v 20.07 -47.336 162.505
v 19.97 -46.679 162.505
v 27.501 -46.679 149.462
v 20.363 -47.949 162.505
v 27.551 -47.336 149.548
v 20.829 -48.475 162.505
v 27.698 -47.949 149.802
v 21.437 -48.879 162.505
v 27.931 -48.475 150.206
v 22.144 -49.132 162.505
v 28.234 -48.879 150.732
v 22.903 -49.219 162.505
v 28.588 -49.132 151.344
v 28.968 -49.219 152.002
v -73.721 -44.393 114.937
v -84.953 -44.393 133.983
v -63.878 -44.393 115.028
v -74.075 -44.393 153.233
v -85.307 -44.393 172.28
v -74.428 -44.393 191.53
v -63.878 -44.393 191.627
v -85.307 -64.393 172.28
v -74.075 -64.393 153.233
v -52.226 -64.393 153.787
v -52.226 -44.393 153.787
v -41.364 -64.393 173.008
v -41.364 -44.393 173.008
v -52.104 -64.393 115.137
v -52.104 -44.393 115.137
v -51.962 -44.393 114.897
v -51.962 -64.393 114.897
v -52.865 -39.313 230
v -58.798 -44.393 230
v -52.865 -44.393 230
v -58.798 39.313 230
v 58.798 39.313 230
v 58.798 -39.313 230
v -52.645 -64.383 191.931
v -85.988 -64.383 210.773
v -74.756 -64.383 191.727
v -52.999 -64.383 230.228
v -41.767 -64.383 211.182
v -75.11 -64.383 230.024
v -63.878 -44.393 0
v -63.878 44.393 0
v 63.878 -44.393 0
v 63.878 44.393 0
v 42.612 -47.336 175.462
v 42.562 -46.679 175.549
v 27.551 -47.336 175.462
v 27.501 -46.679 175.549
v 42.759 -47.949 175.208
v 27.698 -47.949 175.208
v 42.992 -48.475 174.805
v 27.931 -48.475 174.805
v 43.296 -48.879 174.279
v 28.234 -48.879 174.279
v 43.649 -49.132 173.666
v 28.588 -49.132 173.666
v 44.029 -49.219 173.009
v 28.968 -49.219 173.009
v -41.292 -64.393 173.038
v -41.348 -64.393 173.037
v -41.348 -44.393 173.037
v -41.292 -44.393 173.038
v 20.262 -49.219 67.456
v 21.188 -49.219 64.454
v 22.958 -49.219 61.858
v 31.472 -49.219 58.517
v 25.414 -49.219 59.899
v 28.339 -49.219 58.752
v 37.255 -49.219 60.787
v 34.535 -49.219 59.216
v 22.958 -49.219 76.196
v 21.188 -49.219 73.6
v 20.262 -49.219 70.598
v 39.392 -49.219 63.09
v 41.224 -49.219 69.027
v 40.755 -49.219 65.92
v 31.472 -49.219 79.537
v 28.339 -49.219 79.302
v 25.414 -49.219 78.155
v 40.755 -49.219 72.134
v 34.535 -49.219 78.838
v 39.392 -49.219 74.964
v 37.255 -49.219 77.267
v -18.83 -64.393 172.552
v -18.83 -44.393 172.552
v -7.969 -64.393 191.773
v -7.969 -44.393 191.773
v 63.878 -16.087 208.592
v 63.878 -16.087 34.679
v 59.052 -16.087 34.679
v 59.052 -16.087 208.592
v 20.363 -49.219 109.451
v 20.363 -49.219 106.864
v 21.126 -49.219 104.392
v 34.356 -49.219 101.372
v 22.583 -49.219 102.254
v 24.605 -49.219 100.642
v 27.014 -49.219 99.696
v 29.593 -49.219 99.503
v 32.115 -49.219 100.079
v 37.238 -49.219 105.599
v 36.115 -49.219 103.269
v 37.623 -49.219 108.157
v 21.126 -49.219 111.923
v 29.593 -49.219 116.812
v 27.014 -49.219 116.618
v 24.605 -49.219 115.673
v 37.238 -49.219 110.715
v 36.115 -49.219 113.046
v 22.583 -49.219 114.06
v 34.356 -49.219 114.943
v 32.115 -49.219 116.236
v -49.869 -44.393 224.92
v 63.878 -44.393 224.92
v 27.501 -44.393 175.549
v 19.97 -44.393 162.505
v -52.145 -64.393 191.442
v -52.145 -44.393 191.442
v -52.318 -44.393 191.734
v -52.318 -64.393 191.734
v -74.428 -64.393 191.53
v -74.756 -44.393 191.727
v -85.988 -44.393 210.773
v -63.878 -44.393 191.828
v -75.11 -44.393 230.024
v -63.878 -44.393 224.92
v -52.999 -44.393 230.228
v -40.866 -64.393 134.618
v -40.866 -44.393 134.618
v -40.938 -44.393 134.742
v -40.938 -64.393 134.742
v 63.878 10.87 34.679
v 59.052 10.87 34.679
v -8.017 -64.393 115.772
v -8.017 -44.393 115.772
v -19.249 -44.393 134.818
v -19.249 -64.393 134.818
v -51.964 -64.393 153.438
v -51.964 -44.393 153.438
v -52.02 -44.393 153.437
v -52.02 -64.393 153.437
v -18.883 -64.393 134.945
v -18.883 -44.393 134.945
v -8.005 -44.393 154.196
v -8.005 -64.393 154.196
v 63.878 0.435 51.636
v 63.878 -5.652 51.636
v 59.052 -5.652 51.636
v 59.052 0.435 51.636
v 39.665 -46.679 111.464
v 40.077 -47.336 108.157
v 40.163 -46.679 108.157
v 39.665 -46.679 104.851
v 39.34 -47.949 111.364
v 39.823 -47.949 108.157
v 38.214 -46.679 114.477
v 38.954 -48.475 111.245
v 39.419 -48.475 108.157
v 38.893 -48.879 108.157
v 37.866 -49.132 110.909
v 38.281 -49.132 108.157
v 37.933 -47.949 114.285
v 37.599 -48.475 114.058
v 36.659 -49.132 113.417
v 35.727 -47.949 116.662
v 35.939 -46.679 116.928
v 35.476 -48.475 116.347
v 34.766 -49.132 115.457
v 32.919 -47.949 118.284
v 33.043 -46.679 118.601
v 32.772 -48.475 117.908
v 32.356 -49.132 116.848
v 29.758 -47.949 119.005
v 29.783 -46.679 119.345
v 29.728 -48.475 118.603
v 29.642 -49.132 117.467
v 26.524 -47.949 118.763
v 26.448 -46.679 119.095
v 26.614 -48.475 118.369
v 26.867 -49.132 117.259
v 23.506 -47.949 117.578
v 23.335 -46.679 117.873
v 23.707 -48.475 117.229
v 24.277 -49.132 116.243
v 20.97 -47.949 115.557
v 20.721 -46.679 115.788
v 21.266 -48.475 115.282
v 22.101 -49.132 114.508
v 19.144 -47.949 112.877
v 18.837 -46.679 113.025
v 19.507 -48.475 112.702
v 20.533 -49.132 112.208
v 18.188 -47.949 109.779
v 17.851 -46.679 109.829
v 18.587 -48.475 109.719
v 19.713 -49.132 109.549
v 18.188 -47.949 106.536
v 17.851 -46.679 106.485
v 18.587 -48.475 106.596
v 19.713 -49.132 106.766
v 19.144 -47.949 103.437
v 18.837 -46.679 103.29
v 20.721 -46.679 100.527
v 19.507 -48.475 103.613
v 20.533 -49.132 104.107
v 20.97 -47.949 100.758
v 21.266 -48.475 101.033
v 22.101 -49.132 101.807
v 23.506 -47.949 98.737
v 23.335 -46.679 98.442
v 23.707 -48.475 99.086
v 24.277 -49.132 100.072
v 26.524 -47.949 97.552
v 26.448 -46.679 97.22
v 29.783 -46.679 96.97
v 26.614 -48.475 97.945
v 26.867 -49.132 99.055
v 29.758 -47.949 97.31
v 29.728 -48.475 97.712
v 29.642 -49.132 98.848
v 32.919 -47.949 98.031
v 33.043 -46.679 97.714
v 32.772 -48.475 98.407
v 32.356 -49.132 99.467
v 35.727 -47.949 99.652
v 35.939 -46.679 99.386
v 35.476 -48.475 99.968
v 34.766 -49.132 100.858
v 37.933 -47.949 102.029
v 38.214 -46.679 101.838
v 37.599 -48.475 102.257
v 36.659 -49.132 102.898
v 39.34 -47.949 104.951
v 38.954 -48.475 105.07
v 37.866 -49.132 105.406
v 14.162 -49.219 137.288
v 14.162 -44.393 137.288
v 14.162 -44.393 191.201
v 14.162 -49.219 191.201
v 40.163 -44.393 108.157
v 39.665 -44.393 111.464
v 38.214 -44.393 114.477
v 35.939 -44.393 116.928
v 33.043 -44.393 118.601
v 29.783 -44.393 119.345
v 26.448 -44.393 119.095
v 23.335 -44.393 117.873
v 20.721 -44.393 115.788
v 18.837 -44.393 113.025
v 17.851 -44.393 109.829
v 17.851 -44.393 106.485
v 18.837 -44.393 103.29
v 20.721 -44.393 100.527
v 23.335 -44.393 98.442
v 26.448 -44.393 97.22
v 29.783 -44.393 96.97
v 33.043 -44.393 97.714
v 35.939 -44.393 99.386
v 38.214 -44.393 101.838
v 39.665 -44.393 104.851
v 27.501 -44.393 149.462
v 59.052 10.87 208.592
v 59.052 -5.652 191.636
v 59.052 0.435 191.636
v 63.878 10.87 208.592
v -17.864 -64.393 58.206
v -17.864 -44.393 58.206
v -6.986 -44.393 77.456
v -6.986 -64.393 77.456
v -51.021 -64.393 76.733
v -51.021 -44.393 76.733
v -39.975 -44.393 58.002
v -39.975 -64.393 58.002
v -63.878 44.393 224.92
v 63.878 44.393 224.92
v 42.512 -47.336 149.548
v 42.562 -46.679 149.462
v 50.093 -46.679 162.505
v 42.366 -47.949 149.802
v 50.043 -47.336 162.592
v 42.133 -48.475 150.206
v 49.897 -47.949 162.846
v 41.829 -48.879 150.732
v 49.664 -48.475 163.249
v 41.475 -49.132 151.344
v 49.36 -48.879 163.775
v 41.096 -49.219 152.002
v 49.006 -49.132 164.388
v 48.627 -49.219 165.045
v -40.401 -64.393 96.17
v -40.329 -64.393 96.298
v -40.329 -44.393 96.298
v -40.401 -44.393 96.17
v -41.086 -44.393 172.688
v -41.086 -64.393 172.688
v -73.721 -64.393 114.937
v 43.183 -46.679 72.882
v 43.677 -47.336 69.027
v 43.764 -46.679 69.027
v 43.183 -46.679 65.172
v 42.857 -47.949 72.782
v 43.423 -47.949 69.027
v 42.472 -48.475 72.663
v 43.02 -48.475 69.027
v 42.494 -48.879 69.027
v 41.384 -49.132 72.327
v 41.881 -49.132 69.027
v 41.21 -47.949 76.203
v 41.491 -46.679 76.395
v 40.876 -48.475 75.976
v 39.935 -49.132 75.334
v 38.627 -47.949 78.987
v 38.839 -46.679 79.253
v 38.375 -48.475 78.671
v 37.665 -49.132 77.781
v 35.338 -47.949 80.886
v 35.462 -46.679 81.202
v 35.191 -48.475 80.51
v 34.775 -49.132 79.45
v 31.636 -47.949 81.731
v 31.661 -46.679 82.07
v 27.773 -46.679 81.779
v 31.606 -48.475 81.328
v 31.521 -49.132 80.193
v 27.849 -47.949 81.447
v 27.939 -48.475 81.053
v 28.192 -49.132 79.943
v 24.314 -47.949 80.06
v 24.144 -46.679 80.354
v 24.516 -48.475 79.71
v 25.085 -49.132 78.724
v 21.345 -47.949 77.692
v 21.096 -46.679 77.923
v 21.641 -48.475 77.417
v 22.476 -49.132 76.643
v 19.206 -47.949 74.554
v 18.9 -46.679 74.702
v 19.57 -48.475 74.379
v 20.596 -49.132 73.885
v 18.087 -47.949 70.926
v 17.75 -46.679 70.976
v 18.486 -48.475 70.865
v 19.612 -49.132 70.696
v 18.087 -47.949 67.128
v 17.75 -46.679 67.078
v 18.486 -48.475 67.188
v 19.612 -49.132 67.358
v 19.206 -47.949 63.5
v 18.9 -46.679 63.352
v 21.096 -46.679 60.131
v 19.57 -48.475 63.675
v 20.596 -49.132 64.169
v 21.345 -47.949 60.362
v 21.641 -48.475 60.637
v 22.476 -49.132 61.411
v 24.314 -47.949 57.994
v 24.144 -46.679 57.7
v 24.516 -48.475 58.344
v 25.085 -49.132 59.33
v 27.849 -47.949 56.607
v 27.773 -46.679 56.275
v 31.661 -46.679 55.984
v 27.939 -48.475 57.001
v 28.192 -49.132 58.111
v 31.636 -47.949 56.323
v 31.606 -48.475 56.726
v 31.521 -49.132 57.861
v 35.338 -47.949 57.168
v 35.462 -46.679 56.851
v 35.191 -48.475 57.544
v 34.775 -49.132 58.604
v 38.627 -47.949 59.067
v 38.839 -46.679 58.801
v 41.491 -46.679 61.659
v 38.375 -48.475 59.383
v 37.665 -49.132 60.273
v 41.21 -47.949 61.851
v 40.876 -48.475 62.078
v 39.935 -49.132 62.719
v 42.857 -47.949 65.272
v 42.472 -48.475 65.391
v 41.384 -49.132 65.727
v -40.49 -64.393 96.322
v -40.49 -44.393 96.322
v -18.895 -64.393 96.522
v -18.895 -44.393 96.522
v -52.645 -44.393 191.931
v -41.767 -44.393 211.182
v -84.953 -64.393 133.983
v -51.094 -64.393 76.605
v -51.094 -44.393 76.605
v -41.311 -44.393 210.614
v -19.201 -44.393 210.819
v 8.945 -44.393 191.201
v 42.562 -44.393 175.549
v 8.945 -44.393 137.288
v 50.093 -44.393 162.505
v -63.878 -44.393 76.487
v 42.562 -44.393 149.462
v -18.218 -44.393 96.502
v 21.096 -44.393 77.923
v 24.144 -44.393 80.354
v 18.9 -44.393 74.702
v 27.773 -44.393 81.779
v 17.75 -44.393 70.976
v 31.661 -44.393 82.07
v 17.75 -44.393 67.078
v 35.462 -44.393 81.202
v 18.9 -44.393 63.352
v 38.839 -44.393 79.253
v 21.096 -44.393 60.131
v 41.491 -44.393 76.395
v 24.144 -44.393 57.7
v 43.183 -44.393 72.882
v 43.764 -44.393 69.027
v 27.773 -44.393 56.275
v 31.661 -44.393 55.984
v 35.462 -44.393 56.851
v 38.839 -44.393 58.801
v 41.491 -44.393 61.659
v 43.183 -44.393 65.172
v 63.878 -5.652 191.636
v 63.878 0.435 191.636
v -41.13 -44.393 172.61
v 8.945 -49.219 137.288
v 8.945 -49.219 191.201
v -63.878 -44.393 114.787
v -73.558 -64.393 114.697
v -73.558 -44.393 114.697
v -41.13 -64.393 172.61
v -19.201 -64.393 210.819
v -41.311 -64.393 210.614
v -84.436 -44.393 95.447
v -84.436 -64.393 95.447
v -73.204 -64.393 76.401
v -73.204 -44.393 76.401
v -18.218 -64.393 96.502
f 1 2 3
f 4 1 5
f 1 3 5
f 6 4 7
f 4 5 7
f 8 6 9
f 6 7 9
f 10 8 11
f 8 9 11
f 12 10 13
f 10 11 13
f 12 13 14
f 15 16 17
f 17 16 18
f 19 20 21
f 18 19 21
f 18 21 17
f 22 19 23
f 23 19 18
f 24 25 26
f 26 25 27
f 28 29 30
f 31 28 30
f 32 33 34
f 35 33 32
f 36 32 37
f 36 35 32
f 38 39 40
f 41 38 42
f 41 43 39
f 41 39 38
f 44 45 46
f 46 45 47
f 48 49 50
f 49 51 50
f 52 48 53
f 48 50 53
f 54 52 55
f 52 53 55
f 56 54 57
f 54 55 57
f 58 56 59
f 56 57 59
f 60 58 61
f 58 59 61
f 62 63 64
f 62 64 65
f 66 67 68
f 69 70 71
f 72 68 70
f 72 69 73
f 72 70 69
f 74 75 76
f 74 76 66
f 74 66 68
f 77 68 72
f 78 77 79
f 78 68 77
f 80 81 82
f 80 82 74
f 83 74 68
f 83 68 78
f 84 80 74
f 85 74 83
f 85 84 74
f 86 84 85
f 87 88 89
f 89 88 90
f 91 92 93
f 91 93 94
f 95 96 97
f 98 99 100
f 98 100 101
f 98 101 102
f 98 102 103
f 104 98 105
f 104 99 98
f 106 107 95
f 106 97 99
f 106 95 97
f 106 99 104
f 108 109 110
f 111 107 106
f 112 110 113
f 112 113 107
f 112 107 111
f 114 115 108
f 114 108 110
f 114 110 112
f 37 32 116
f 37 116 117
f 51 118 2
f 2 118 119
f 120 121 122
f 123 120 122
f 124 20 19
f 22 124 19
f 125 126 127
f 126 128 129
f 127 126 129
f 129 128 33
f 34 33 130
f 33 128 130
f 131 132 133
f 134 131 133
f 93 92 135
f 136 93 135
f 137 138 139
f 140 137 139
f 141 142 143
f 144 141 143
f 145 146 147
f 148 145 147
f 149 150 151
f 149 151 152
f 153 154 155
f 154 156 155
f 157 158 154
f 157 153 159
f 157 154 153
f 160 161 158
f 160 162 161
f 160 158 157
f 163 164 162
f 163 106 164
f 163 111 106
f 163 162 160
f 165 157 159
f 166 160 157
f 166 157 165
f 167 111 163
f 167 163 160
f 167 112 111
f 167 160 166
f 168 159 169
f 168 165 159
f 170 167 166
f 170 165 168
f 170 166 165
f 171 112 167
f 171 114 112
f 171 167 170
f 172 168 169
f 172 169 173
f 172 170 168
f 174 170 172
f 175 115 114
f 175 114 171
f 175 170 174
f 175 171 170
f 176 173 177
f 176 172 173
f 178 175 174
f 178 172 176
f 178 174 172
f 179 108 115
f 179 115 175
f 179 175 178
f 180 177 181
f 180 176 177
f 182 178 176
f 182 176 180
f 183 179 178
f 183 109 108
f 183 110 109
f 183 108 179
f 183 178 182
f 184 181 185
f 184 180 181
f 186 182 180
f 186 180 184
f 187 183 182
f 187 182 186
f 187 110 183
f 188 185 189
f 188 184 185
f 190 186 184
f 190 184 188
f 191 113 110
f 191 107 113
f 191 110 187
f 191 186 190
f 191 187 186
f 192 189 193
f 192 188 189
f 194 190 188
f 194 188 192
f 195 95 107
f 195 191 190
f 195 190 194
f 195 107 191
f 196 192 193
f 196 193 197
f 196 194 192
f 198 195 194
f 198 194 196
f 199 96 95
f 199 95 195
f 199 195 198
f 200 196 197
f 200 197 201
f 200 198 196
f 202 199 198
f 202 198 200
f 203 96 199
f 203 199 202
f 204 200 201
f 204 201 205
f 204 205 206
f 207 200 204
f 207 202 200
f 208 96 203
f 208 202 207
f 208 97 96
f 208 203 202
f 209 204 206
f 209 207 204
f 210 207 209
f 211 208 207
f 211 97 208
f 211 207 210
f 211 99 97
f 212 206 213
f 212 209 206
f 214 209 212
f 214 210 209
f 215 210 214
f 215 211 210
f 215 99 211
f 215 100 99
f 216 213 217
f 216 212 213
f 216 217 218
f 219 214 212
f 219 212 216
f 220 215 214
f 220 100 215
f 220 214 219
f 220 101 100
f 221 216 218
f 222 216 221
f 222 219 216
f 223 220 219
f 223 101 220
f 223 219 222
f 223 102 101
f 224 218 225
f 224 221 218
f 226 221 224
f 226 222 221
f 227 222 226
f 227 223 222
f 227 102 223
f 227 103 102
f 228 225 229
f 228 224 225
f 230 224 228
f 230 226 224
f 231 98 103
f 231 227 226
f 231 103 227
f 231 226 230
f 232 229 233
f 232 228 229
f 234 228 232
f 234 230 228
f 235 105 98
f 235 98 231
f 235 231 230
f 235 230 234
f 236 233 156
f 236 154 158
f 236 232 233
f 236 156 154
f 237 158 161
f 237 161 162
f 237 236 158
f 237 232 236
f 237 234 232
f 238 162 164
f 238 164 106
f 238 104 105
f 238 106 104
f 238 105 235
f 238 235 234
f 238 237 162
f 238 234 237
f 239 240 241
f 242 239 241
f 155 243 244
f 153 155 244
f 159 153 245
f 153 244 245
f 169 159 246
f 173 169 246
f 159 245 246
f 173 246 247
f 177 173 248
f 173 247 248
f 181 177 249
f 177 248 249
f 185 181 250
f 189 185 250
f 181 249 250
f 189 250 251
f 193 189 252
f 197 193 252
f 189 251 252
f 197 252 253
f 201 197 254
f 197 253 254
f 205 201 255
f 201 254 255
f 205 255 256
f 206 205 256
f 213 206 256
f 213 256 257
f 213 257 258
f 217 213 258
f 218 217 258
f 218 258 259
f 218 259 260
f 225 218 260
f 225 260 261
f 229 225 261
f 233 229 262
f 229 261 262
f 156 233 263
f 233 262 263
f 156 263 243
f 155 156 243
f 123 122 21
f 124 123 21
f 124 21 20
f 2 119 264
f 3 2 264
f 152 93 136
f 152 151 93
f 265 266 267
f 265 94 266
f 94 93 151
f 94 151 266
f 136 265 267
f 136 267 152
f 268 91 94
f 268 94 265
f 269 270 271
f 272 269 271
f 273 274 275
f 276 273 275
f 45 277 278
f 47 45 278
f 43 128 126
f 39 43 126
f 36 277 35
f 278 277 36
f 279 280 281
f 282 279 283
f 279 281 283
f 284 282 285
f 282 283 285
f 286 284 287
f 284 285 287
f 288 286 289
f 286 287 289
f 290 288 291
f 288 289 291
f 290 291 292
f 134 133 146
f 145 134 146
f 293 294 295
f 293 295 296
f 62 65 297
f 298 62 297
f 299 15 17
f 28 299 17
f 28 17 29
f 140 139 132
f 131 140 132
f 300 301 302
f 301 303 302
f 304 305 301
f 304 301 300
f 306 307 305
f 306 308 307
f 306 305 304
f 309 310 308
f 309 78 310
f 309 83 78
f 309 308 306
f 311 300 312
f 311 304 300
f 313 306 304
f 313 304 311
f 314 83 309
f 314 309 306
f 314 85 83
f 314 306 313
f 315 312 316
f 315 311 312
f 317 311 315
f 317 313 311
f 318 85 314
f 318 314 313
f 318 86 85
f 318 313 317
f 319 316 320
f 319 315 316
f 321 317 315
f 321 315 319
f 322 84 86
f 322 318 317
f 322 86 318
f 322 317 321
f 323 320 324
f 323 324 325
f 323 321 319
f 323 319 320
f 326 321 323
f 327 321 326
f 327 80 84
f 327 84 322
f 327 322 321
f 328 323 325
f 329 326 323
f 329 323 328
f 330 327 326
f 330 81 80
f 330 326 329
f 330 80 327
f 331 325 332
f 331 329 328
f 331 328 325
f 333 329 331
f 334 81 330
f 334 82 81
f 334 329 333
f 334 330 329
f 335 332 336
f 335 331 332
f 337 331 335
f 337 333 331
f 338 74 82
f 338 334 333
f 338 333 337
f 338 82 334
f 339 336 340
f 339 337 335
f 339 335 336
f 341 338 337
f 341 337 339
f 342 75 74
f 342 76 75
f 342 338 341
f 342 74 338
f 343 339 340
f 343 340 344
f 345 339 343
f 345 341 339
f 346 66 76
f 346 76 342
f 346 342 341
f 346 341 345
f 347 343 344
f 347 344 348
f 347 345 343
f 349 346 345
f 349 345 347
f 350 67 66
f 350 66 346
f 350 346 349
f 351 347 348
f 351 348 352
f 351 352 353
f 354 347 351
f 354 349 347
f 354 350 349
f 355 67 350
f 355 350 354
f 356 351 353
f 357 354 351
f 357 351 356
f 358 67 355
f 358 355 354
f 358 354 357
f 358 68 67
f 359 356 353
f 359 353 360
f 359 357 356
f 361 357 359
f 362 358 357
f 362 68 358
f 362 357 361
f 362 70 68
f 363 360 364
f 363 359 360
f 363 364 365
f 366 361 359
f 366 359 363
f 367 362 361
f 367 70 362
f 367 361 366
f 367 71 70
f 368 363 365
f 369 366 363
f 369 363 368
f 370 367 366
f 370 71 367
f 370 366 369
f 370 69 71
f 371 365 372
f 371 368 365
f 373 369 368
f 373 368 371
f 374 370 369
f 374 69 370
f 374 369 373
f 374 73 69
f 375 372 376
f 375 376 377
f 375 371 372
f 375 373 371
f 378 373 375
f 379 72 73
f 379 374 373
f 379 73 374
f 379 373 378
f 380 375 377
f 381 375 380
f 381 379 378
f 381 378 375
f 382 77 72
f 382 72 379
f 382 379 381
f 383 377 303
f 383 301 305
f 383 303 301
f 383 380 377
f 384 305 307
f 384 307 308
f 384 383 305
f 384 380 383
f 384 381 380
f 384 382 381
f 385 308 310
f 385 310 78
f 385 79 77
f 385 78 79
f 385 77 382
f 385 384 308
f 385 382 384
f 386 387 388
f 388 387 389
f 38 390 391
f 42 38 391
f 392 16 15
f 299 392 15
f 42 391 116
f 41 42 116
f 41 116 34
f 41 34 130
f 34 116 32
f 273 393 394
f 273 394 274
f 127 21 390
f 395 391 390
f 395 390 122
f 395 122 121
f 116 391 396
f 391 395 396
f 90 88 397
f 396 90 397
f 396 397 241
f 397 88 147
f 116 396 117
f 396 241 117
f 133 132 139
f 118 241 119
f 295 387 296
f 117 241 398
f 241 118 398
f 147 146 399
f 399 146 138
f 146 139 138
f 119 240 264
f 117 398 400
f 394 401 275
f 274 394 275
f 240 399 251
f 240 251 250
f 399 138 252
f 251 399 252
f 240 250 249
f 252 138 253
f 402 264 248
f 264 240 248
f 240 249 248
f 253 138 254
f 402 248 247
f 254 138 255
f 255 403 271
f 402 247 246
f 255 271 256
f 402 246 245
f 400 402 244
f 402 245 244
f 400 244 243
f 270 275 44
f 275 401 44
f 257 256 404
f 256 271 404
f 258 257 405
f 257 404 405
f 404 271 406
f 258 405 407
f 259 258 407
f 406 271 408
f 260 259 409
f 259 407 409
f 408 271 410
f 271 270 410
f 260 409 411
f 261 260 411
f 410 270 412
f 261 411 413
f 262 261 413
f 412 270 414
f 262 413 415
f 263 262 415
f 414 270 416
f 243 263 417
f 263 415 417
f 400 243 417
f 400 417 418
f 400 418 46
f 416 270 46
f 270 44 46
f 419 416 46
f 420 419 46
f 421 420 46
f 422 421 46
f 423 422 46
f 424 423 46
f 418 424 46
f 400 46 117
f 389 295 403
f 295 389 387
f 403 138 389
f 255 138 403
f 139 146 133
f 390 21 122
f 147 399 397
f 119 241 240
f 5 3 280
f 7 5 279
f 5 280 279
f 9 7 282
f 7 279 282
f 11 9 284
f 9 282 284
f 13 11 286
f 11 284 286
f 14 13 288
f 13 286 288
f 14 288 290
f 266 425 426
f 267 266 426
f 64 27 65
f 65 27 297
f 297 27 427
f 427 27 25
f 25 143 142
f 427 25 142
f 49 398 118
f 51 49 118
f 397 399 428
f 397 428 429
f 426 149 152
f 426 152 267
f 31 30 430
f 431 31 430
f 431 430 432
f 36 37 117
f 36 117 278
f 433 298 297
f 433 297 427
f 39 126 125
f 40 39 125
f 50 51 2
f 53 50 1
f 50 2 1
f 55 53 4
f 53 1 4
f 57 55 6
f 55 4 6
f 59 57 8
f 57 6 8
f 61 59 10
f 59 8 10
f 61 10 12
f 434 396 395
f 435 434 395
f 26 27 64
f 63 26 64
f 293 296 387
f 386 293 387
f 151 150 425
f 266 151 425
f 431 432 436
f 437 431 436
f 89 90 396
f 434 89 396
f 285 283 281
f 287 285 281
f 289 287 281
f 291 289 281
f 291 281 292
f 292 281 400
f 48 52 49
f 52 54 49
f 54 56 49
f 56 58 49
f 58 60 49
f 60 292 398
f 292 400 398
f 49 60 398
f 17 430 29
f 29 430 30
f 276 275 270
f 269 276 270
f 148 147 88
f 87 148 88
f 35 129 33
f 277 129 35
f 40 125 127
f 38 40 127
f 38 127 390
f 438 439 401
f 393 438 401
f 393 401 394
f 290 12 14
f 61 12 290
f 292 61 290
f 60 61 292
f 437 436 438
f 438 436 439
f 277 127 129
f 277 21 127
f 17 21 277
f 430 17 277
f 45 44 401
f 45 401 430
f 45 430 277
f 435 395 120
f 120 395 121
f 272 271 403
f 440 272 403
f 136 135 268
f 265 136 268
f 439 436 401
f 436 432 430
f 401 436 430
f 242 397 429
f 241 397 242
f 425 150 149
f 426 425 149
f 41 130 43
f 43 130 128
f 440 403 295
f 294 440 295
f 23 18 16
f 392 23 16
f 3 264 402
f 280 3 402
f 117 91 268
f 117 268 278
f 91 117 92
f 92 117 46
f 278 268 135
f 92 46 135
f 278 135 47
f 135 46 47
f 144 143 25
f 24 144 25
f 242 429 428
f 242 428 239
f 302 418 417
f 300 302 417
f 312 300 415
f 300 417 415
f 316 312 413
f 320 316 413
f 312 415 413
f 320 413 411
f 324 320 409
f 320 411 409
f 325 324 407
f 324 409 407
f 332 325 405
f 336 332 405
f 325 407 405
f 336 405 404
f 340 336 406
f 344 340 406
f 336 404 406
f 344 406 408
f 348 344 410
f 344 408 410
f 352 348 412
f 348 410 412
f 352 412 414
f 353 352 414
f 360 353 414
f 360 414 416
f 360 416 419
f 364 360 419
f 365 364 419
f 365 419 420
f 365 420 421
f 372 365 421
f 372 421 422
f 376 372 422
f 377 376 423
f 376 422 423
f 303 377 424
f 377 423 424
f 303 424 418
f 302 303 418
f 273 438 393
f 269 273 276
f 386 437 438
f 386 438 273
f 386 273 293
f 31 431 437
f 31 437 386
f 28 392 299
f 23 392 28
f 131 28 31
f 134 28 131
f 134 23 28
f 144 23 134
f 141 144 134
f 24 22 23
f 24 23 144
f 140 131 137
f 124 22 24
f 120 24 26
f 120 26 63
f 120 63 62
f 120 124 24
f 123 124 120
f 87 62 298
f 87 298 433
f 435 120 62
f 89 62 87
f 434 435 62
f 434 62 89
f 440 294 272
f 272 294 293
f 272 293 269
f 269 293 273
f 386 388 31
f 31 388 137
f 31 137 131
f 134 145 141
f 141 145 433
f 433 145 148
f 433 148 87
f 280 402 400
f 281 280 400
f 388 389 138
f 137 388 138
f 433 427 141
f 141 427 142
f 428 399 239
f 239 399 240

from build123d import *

# Parameters (mm, degrees)
F0_W      = 127.7551352978
F0_H      = 88.7857824564
F1_DEPTH  = 230
F4_DEPTH  = 20
F5_DEPTH  = 19.9898
F6_W      = 26.9565298222
F6_H      = 173.913128674
F6_W_2    = 6.0869585723
F6_H_2    = 140.0000751019
F7_DEPTH  = 4.826
F8_SIZE   = 5.08
F9_R      = 13.0796675924
F9_R_2    = 11.2186028003
F9_W      = 5.2173919976
F9_H      = 53.9130866528
F10_DEPTH = 4.826
F11_R     = 2.54


with BuildPart() as f1:
    # F0 (on Top) → F1 (new body)
    with BuildSketch(Plane.XY):
        Rectangle(F0_W, F0_H)
    extrude(amount=F1_DEPTH)

    # F3 (on face) → F4 (join)
    with BuildSketch(Plane.XZ.offset(44.3928912282)):
        Polygon((-41.2921301063, 173.0379974811), (-41.085819379, 172.688162985), (-41.1297441764, 172.6104329043), (-40.9572269026, 172.3179008855), (-18.8467815635, 172.5222300093), (-18.8301746286, 172.5516179285), (-19.2372092384, 173.2418134869), align=None)
        Polygon((-40.9572269026, 172.3179008855), (-41.1297441764, 172.6104329043), (-51.9640878366, 153.4377910705), (-40.9382216824, 134.7415827759), (-18.8833008145, 134.9453987817), (-8.0050323569, 154.1957706962), (-18.8301746286, 172.5516179285), (-18.8467815635, 172.5222300093), align=None)
        Polygon((-41.3476545775, 173.0374843632), (-41.2921301063, 173.0379974811), (-52.1454789867, 191.4416737569), (-52.1894037841, 191.3639436762), (-41.3642615124, 173.008096444), align=None)
        Polygon((-52.1454789867, 191.4416737569), (-41.2921301063, 173.0379974811), (-19.2372092384, 173.2418134869), (-18.8301746286, 172.5516179285), (-7.968513106, 191.7726019238), (-19.2006899874, 210.8186447145), (-41.3111353265, 210.6143155907), align=None)
        Polygon((-40.9382216824, 134.7415827759), (-51.9640878366, 153.4377910705), (-52.0196123078, 153.4372779525), (-40.9937461536, 134.7410696579), align=None)
        Polygon((-52.225923035, 153.7871124486), (-41.3642615124, 173.008096444), (-52.1894037841, 191.3639436762), (-52.1454789867, 191.4416737569), (-52.3179962605, 191.7342057757), (-74.4284415995, 191.5298766519), (-85.3067100571, 172.2795047374), (-74.0745331757, 153.2334619467), (-52.0196123078, 153.4372779525), align=None)
        Polygon((-40.9937461536, 134.7410696579), (-52.0196123078, 153.4372779525), (-74.0745331757, 153.2334619467), (-84.9528016333, 133.9830900322), (-73.7206247518, 114.9370472415), (-52.1037964015, 115.1368147056), (-52.2374327127, 115.3634175206), (-41.3591642551, 134.6137894351), (-40.8655472663, 134.6183510948), (-40.9382216824, 134.7415827759), align=None)
        Polygon((-19.248718916, 134.8181185589), (-40.8655472663, 134.6183510948), (-40.7319109552, 134.3917482798), (-51.6101794127, 115.1413763653), (-52.1037964015, 115.1368147056), (-51.9623043786, 114.8968912116), (-51.4474166697, 114.9016494402), (-40.4903681222, 96.3221329585), (-18.8948104921, 96.5217038537), (-8.0165420346, 115.7720757682), align=None)
        Polygon((-40.7319109552, 134.3917482798), (-40.8655472663, 134.6183510948), (-41.3591642551, 134.6137894351), (-52.2374327127, 115.3634175206), (-52.1037964015, 115.1368147056), (-51.6101794127, 115.1413763653), align=None)
        Polygon((-41.0052558312, 96.3173747299), (-51.9623043786, 114.8968912116), (-73.5578620087, 114.6973203164), (-84.4361304663, 95.4469484019), (-73.2039535849, 76.4009056112), (-51.0935082458, 76.605234735), (-51.0213053835, 76.7330061684), (-51.2069400891, 77.0477809963), (-40.4008744938, 96.1703814775), (-40.4903681222, 96.3221329585), align=None)
        Polygon((-51.4474166697, 114.9016494402), (-51.9623043786, 114.8968912116), (-41.0052558312, 96.3173747299), (-40.4903681222, 96.3221329585), align=None)
        Polygon((-40.3286716315, 96.2981529109), (-40.4008744938, 96.1703814775), (-40.2152397882, 95.8556066495), (-51.0213053835, 76.7330061684), (-39.9747632076, 58.0017382056), (-17.8643178685, 58.2060673294), (-6.986049411, 77.4564392439), (-18.2182262924, 96.5024820346), align=None)
        Polygon((-40.2152397882, 95.8556066495), (-40.4008744938, 96.1703814775), (-51.2069400891, 77.0477809963), (-51.0213053835, 76.7330061684), align=None)
    extrude(amount=F4_DEPTH)

    # F2 (on face) → F5 (join)
    with BuildSketch(Plane.XZ.offset(44.3928912282)):
        Polygon((-52.6453907674, 191.9314519259), (-41.7671223098, 211.1818238404), (-52.9992991913, 230.2278666311), (-75.1097445304, 230.0235375074), (-85.9880129879, 210.7731655929), (-74.7558361065, 191.7271228021), align=None)
    extrude(amount=F5_DEPTH)

    # F6 (on face) → F7 (cut)
    with BuildSketch(Plane.YZ.offset(63.8775676489)):
        with Locations((-2.6086920407, 121.6356754303)):
            Rectangle(F6_W, F6_H)
        with Locations((-2.6086920407, 121.6356754303)):
            Rectangle(F6_W_2, F6_H_2, mode=Mode.SUBTRACT)
    extrude(amount=-F7_DEPTH, mode=Mode.SUBTRACT)

    # F8
    f8_edges = [f1.edges().sort_by_distance(p)[0] for p in [
        (5.506325, -44.392891, 230),
        (63.877568, 0, 230),
        (0, 44.392891, 230),
        (-63.877568, 0, 230),
    ]]
    chamfer(f8_edges, length=F8_SIZE)

    # F9 (on face) → F10 (join)
    with BuildSketch(Plane.XZ.offset(44.3928912282)):
        with Locations((30.683927238, 69.0269544721)):
            Circle(F9_R)
        with Locations((28.9447959512, 108.1574112177)):
            Circle(F9_R_2)
        with Locations((11.5534868091, 164.2443984747)):
            Rectangle(F9_W, F9_H)
        Polygon((27.5010903101, 149.4617760181), (42.562418737, 149.4617760181), (50.0930829504, 162.5052690506), (42.562418737, 175.5487620831), (27.5010903101, 175.5487620831), (19.9704260966, 162.5052690506), align=None)
    extrude(amount=F10_DEPTH)

    # F11
    f11_edges = [f1.edges().sort_by_distance(p)[0] for p in [
        (35.031755, -49.218891, 175.548762),
        (46.327751, -49.218891, 155.983523),
        (35.031755, -49.218891, 149.461776),
        (23.735758, -49.218891, 155.983523),
        (23.735758, -49.218891, 169.027016),
        (17.726193, -49.218891, 108.157411),
        (17.60426, -49.218891, 69.026954),
    ]]
    fillet(f11_edges, radius=F11_R)


solid = f1.part
